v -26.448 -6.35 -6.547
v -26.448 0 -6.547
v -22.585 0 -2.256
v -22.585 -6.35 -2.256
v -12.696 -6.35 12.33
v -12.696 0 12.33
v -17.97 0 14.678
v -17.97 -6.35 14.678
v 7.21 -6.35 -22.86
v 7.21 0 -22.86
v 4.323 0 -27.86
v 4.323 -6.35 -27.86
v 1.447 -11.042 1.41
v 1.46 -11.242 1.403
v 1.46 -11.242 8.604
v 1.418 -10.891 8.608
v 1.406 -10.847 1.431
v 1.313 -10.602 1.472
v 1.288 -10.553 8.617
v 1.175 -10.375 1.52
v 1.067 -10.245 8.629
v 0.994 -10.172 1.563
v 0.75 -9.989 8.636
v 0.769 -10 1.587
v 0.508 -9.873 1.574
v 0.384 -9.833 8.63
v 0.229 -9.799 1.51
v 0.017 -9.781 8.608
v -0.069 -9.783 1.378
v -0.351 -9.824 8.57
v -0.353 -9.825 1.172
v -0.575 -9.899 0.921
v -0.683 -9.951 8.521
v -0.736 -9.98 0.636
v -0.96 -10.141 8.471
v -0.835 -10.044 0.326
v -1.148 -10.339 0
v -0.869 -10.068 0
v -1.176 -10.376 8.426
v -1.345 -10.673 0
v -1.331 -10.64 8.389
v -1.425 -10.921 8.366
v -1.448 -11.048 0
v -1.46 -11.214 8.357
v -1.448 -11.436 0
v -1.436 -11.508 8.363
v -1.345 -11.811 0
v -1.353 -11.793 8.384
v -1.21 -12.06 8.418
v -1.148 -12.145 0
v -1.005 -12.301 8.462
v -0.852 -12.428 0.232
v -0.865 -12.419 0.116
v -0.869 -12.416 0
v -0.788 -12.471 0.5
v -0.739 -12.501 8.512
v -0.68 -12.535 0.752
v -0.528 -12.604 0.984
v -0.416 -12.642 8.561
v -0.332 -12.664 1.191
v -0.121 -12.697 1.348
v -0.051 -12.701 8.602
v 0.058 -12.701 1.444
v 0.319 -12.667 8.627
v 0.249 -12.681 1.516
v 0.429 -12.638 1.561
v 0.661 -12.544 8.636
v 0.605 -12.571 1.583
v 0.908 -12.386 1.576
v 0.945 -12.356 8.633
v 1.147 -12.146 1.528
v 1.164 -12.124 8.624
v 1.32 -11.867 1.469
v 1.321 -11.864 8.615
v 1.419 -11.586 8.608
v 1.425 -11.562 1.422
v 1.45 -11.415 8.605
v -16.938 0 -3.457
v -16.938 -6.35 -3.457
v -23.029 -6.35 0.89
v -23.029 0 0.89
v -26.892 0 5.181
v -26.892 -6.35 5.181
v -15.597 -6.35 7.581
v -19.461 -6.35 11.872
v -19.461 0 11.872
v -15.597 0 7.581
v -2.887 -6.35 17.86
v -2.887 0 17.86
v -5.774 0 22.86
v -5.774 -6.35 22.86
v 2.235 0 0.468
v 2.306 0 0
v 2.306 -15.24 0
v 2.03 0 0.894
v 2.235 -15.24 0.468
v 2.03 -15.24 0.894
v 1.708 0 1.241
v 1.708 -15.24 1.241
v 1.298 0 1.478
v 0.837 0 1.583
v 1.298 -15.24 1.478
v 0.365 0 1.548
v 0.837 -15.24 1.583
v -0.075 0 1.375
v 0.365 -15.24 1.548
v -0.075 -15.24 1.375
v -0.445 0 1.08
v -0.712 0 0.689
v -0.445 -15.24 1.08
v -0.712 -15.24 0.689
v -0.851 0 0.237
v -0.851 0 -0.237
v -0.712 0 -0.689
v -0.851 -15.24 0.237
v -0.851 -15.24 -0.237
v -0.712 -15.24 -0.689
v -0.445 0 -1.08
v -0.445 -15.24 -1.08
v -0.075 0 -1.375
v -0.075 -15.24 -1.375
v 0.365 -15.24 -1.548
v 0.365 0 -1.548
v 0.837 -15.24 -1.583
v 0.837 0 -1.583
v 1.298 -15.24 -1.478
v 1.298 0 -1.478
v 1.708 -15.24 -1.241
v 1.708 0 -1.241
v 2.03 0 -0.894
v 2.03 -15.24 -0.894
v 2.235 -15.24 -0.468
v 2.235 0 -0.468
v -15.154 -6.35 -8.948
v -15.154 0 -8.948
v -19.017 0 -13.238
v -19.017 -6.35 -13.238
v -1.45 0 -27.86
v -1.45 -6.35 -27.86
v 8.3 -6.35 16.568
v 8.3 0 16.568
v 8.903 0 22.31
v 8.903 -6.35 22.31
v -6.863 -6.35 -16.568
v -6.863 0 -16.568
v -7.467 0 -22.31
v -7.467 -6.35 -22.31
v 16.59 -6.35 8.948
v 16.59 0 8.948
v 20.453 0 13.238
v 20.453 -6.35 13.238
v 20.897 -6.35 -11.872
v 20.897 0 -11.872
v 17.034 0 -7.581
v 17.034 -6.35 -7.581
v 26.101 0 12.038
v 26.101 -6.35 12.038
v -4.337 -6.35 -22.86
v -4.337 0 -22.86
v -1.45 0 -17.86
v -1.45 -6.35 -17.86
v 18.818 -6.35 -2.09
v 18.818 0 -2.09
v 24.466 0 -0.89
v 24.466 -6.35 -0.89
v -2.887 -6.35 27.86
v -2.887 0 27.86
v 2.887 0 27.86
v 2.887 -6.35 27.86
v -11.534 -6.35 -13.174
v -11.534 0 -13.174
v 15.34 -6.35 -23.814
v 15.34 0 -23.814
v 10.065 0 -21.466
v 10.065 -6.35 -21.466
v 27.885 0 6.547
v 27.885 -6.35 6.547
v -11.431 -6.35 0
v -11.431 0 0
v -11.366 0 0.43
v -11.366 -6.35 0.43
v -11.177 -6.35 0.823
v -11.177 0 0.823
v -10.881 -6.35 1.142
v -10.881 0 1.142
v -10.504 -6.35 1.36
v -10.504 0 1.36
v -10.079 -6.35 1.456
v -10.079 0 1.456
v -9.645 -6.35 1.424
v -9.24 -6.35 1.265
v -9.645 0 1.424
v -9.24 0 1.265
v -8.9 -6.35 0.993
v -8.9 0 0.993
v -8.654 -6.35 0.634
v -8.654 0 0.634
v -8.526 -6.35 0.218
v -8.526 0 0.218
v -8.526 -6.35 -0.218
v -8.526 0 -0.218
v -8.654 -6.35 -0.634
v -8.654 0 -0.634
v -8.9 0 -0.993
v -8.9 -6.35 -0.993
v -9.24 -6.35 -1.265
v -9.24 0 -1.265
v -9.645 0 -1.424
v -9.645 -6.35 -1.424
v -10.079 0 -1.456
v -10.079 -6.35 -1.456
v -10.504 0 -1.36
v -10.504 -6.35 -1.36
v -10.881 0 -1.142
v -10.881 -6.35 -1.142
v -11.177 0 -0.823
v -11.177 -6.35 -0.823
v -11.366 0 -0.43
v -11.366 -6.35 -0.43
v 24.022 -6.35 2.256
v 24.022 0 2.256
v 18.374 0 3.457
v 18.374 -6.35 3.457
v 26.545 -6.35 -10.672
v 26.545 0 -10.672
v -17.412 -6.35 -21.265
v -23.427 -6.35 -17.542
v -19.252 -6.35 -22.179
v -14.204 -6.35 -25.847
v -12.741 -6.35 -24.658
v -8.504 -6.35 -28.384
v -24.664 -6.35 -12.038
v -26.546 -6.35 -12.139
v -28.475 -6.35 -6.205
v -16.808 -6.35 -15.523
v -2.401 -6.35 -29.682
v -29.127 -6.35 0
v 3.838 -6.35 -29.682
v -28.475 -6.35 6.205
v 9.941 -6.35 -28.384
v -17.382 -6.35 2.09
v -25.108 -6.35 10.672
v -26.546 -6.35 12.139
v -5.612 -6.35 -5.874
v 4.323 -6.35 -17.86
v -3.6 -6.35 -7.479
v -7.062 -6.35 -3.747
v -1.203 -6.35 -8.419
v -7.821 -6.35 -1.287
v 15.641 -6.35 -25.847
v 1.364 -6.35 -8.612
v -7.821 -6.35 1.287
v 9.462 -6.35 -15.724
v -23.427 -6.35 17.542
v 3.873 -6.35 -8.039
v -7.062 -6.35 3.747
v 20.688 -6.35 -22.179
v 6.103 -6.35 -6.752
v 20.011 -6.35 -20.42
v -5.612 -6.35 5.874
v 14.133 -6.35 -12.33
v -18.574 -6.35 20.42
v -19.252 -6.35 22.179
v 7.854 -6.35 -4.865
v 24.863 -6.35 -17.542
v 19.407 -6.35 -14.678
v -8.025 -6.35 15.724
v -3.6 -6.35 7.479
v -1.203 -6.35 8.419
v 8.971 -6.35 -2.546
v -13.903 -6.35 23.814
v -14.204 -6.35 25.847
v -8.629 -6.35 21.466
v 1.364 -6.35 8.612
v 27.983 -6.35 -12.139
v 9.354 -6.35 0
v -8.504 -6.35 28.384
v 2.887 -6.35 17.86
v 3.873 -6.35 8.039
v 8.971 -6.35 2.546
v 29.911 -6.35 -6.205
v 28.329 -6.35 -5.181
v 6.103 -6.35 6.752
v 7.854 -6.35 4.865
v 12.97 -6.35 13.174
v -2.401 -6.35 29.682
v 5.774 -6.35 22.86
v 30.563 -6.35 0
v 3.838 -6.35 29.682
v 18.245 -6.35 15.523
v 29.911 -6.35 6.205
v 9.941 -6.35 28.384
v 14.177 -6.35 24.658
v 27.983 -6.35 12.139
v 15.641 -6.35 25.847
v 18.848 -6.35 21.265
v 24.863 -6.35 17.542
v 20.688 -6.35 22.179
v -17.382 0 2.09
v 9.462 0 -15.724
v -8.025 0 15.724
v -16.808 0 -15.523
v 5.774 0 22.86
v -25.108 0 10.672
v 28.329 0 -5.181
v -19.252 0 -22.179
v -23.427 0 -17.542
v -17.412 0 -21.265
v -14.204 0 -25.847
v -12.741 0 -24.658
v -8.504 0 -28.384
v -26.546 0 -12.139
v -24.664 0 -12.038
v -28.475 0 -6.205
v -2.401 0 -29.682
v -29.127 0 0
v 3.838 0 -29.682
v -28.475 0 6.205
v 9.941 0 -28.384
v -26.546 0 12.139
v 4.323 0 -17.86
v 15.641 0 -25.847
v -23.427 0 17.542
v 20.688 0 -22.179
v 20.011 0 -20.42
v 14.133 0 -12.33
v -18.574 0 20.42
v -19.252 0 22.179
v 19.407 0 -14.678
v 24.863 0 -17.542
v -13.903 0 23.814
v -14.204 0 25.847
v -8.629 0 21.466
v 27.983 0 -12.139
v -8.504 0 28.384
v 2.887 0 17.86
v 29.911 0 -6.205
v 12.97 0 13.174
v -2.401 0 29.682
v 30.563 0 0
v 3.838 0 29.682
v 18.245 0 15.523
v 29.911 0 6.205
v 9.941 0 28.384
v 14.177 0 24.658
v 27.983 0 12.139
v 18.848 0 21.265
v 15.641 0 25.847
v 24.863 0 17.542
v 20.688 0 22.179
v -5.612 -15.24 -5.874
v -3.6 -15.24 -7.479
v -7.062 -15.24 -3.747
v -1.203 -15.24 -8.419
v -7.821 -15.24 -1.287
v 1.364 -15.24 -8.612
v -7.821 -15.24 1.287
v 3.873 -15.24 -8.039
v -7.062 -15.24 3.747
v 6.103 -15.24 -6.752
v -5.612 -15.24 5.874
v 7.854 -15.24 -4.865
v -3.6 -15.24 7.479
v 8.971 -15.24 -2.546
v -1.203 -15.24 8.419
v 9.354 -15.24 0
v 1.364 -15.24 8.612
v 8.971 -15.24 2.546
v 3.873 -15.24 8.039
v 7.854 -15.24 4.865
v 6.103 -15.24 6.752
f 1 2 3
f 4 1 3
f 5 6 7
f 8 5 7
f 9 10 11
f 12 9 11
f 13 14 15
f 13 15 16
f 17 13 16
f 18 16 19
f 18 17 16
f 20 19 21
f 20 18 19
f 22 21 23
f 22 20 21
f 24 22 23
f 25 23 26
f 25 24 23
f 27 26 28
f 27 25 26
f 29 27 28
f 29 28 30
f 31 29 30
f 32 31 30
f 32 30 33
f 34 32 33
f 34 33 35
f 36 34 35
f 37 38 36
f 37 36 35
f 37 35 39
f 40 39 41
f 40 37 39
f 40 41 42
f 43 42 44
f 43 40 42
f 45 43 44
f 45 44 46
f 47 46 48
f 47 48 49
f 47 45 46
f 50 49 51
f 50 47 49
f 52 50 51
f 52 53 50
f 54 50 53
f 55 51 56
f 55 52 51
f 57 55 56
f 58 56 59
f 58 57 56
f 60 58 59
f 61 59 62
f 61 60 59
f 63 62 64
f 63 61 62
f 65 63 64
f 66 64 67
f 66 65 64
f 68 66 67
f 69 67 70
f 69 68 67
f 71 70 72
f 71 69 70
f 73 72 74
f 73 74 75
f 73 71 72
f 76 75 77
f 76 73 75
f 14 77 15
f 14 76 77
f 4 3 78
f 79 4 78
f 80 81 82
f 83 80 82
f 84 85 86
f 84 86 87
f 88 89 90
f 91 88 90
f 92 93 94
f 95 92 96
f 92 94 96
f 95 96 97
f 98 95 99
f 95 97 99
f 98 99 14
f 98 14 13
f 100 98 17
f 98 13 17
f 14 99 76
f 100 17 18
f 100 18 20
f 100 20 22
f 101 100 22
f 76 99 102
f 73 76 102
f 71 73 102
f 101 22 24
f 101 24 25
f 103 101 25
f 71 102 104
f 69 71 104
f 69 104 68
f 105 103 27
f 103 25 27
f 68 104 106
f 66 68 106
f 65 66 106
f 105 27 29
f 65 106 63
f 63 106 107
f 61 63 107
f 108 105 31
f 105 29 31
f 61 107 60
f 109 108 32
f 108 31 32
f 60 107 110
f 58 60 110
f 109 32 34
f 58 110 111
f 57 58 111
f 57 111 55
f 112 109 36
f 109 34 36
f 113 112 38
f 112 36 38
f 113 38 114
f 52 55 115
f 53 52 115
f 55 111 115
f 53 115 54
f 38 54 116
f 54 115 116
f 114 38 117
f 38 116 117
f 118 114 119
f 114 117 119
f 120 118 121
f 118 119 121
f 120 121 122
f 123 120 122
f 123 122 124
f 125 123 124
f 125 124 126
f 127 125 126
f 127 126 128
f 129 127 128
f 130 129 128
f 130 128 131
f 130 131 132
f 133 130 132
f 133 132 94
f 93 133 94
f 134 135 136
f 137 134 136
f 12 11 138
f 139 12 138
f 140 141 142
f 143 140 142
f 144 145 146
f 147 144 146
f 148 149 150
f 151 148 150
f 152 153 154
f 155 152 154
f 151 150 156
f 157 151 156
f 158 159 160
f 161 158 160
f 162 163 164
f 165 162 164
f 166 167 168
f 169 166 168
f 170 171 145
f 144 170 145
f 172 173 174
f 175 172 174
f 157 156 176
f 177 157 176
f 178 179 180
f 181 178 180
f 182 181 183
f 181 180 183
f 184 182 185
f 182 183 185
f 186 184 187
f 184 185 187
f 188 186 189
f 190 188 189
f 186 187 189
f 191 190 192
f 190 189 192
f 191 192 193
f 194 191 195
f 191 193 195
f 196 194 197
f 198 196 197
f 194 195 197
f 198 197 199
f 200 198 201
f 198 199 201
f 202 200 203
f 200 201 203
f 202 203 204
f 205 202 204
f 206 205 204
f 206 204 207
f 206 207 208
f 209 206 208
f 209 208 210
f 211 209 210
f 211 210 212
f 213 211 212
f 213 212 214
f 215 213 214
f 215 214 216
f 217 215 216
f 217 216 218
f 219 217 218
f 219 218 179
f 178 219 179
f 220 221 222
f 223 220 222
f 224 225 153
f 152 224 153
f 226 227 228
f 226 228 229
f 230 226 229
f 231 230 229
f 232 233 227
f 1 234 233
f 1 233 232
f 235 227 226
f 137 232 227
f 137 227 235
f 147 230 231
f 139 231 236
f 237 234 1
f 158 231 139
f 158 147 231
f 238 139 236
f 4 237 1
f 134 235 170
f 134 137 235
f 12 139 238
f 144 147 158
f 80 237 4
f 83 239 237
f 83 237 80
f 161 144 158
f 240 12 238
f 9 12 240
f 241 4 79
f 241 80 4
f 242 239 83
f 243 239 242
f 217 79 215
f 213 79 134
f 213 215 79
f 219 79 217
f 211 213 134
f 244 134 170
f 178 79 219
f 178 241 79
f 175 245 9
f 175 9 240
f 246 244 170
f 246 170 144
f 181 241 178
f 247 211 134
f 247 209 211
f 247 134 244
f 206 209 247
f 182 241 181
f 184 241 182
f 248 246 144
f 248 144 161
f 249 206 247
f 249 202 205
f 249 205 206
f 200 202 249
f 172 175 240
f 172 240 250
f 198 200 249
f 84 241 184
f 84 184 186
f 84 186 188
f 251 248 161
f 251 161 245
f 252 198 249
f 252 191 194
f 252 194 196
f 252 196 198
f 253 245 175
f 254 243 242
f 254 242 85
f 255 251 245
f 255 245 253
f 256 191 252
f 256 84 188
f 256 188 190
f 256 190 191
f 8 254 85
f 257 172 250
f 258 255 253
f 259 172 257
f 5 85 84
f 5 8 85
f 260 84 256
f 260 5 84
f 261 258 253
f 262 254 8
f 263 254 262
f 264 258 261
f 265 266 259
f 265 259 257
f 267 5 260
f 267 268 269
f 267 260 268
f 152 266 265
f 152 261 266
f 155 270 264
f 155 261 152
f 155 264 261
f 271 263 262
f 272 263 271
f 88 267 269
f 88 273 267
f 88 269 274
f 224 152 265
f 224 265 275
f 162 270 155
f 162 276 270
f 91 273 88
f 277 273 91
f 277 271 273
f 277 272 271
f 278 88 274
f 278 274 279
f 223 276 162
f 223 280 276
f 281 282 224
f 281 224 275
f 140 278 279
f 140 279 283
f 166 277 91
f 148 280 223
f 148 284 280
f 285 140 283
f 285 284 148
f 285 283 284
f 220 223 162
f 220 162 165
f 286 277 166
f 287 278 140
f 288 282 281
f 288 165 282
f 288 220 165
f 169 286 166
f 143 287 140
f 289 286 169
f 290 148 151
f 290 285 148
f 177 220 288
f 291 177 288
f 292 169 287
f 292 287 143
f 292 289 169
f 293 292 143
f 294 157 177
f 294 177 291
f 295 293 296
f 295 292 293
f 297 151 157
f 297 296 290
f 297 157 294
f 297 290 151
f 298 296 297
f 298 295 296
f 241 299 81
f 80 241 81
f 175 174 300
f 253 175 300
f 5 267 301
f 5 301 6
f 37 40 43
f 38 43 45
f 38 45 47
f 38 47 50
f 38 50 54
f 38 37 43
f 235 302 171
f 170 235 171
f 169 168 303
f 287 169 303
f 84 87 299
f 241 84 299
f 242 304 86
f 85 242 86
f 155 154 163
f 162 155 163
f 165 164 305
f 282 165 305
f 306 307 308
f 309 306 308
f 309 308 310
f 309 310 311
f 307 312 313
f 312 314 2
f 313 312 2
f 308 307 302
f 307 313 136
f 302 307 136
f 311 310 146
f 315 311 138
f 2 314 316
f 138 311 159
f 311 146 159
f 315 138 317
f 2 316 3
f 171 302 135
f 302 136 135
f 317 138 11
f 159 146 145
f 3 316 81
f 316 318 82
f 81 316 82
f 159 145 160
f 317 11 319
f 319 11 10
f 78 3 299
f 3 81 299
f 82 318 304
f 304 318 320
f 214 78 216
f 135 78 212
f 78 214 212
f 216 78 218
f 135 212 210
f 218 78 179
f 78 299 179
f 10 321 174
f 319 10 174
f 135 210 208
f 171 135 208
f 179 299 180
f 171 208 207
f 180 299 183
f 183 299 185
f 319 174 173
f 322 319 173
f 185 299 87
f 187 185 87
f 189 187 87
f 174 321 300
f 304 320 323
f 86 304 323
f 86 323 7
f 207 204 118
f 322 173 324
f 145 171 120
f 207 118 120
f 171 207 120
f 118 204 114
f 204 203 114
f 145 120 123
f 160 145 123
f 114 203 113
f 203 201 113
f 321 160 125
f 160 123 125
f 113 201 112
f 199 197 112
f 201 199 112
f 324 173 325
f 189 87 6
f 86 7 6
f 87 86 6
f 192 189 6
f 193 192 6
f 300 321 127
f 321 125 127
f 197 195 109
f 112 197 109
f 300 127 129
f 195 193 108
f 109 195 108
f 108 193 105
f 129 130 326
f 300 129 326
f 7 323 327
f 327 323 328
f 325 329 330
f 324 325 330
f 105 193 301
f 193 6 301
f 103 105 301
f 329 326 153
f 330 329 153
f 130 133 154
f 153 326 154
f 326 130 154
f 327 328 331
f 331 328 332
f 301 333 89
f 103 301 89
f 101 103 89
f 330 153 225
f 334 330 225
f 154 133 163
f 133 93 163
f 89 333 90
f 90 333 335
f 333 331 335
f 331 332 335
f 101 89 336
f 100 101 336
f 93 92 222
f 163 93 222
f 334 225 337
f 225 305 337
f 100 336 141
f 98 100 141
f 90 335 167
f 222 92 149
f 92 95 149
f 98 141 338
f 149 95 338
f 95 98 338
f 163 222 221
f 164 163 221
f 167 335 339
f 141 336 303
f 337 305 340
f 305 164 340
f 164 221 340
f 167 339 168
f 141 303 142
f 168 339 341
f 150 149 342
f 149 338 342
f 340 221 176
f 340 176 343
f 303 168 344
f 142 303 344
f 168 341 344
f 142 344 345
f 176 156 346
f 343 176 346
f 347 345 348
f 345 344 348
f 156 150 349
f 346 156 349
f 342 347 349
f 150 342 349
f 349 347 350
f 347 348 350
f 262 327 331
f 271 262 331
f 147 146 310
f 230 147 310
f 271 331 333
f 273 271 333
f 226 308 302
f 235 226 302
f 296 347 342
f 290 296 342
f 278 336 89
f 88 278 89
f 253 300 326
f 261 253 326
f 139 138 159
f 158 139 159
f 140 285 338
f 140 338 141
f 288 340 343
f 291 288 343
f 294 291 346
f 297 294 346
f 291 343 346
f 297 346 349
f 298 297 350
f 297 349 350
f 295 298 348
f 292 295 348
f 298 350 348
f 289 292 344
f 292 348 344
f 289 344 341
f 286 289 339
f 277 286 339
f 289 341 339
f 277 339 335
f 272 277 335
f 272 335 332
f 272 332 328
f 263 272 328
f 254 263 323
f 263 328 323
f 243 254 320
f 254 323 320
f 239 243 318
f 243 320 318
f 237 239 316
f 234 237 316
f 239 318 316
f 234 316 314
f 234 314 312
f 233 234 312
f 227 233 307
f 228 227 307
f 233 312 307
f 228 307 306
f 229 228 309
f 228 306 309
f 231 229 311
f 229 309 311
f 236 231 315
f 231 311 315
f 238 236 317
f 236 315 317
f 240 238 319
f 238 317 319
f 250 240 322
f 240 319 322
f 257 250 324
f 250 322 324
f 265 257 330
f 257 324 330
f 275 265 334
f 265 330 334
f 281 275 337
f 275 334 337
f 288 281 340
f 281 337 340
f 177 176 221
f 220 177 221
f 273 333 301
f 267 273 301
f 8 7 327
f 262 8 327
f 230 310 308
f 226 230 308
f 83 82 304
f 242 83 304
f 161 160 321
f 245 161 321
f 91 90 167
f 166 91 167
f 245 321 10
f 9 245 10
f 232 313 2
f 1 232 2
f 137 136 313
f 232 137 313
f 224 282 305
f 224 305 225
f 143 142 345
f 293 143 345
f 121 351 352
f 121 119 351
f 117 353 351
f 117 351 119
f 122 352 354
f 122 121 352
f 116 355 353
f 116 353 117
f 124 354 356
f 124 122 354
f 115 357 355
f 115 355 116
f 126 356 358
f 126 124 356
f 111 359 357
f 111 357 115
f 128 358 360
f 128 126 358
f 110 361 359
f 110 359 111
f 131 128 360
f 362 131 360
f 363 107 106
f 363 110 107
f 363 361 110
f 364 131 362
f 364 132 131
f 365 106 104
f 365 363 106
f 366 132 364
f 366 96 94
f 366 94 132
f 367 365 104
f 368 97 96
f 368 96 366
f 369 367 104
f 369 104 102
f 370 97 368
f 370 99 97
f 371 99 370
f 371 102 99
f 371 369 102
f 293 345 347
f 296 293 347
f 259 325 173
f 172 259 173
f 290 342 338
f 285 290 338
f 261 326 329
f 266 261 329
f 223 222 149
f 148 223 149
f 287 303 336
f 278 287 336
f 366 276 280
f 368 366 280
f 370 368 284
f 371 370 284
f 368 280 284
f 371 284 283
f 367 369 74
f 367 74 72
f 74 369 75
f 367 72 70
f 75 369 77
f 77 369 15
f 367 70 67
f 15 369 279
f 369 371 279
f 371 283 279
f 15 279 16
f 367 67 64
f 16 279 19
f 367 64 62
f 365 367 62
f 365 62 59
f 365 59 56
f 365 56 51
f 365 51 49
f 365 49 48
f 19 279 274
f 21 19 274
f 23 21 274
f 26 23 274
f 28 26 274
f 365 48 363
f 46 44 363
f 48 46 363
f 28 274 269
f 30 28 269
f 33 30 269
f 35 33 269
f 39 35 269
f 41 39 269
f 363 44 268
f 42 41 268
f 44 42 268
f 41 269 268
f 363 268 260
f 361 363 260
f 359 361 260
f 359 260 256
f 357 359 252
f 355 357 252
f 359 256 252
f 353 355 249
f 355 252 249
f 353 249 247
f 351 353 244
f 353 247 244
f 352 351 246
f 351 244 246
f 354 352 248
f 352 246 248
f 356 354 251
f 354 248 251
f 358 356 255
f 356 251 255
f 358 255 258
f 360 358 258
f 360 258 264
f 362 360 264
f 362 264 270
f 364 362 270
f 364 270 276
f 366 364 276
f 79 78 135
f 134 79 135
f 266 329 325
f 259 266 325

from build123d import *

# Parameters (mm, degrees)
F0_R     = 29.845
F1_DEPTH = 6.35
F2_R     = 8.636
F3_DEPTH = 8.89
F4_R     = 1.5875
F5_DEPTH = 15.241
F6_R     = 1.4605
F7_DEPTH = 15.241
F8_R     = 1.4605
F9_DEPTH = 29.846


with BuildPart() as f1:
    # F0 (on Front) → F1 (new body)
    with BuildSketch(Plane.XZ):
        with Locations((0.718291, 0)):
            Circle(F0_R)
        Polygon((-12.740865, -24.658204), (-17.411727, -21.264625), (-16.808232, -15.52275), (-11.533875, -13.174455), (-6.863013, -16.568034), (-7.466508, -22.309909), align=None, mode=Mode.SUBTRACT)
        Polygon((-24.664124, -12.037813), (-26.448234, -6.546885), (-22.585007, -2.256337), (-16.937669, -3.456715), (-15.153559, -8.947643), (-19.016786, -13.238191), align=None, mode=Mode.SUBTRACT)
        Polygon((4.323334, -27.86), (-1.450169, -27.86), (-4.33692, -22.86), (-1.450169, -17.86), (4.323334, -17.86), (7.210085, -22.86), align=None, mode=Mode.SUBTRACT)
        Polygon((20.010529, -20.420223), (15.339667, -23.813802), (10.06531, -21.465507), (9.461815, -15.723632), (14.132676, -12.330053), (19.407034, -14.678348), align=None, mode=Mode.SUBTRACT)
        Polygon((28.328745, -5.180614), (26.544635, -10.671542), (20.897297, -11.87192), (17.034069, -7.581372), (18.81818, -2.090444), (24.465518, -0.890066), align=None, mode=Mode.SUBTRACT)
        Polygon((-26.892163, 5.180614), (-25.108052, 10.671542), (-19.460715, 11.87192), (-15.597487, 7.581372), (-17.381598, 2.090444), (-23.028935, 0.890066), align=None, mode=Mode.SUBTRACT)
        Polygon((-18.573947, 20.420223), (-13.903085, 23.813802), (-8.628728, 21.465507), (-8.025232, 15.723632), (-12.696094, 12.330053), (-17.970451, 14.678348), align=None, mode=Mode.SUBTRACT)
        Polygon((5.773503, 22.86), (2.886751, 17.86), (-2.886751, 17.86), (-5.773503, 22.86), (-2.886751, 27.86), (2.886751, 27.86), align=None, mode=Mode.SUBTRACT)
        Polygon((26.100706, 12.037813), (27.884817, 6.546885), (24.021589, 2.256337), (18.374252, 3.456715), (16.590141, 8.947643), (20.453368, 13.238191), align=None, mode=Mode.SUBTRACT)
        Polygon((14.177448, 24.658204), (18.848309, 21.264625), (18.244814, 15.52275), (12.970457, 13.174455), (8.299595, 16.568034), (8.90309, 22.309909), align=None, mode=Mode.SUBTRACT)
    extrude(amount=F1_DEPTH)

    # F2 (on face) → F3 (join)
    with BuildSketch(Plane.XZ.offset(6.35)):
        with Locations((0.718291, 0)):
            Circle(F2_R)
    extrude(amount=F3_DEPTH)

    # F4 (on face) → F5 (cut, through all)
    with BuildSketch(Plane.XZ.offset(15.24)):
        with Locations((0.718291, 0)):
            Circle(F4_R)
    extrude(amount=-F5_DEPTH, mode=Mode.SUBTRACT)

    # F6 (on face) → F7 (cut, through all)
    with BuildSketch(Plane(origin=(0, 0, 0), x_dir=(-1, 0, 0), z_dir=(0, 1, 0))):
        with Locations((9.9703, 0)):
            Circle(F6_R)
    extrude(amount=-F7_DEPTH, mode=Mode.SUBTRACT)

    # F8 (on Top) → F9 (cut, through all)
    with BuildSketch(Plane.XY):
        with Locations((0, -11.241886)):
            Circle(F8_R)
    extrude(amount=F9_DEPTH, mode=Mode.SUBTRACT)


solid = f1.part
